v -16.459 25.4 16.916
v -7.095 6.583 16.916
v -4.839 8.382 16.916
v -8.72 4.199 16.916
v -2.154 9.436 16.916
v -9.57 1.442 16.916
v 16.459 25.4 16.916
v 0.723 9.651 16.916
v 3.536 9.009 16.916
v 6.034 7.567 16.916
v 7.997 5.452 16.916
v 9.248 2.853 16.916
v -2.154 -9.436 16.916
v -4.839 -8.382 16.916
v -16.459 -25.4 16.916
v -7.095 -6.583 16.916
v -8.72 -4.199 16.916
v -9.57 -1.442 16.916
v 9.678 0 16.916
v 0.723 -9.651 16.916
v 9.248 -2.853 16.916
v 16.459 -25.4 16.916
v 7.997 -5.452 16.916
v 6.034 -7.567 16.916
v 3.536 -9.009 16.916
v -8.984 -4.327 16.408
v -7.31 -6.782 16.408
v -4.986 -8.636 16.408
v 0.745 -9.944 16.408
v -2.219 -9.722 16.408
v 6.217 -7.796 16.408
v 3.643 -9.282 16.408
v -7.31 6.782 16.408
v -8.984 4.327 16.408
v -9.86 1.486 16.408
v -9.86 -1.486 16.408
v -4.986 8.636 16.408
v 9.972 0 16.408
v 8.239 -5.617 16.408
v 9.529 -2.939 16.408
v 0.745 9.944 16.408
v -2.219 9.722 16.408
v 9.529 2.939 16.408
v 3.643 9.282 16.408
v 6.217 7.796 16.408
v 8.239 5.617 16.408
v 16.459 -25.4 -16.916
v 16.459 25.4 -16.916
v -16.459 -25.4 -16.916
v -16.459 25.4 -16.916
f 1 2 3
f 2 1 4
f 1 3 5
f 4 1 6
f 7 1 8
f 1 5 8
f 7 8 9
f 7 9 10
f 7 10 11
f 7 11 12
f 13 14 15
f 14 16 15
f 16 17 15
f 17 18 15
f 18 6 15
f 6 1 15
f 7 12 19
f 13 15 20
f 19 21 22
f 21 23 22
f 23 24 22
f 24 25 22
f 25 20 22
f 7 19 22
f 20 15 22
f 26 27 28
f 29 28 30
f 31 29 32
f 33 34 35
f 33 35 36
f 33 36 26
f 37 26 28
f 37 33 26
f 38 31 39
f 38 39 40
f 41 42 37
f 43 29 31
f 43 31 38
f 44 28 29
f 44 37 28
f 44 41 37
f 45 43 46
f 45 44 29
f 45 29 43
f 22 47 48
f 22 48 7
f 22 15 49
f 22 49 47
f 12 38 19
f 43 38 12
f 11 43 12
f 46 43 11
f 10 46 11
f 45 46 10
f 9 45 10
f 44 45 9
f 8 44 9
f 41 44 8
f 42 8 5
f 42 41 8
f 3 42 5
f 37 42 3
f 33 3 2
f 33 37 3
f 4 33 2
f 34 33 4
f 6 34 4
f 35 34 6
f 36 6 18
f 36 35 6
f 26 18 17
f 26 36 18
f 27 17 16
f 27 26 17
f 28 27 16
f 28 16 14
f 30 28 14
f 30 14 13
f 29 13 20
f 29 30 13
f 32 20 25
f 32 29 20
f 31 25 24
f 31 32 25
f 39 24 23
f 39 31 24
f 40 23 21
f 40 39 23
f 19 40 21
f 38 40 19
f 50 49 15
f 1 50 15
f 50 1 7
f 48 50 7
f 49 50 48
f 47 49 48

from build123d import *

# Parameters (mm, degrees)
F0_W     = 32.9184010625
F0_H     = 33.8327996433
F1_DEPTH = 25.4
F2_R     = 9.6783003352
F3_DEPTH = 0.508
F3_TAPER = -30


with BuildPart() as f1:
    # F0 (on Front) → F1 (new body, symmetric)
    with BuildSketch(Plane.XZ):
        Rectangle(F0_W, F0_H)
    extrude(amount=F1_DEPTH, both=True)

    # F2 (on face) → F3 (cut)
    with BuildSketch(Plane.XY.offset(16.9163998216)):
        Circle(F2_R)
    extrude(amount=-F3_DEPTH, taper=F3_TAPER, mode=Mode.SUBTRACT)


solid = f1.part
